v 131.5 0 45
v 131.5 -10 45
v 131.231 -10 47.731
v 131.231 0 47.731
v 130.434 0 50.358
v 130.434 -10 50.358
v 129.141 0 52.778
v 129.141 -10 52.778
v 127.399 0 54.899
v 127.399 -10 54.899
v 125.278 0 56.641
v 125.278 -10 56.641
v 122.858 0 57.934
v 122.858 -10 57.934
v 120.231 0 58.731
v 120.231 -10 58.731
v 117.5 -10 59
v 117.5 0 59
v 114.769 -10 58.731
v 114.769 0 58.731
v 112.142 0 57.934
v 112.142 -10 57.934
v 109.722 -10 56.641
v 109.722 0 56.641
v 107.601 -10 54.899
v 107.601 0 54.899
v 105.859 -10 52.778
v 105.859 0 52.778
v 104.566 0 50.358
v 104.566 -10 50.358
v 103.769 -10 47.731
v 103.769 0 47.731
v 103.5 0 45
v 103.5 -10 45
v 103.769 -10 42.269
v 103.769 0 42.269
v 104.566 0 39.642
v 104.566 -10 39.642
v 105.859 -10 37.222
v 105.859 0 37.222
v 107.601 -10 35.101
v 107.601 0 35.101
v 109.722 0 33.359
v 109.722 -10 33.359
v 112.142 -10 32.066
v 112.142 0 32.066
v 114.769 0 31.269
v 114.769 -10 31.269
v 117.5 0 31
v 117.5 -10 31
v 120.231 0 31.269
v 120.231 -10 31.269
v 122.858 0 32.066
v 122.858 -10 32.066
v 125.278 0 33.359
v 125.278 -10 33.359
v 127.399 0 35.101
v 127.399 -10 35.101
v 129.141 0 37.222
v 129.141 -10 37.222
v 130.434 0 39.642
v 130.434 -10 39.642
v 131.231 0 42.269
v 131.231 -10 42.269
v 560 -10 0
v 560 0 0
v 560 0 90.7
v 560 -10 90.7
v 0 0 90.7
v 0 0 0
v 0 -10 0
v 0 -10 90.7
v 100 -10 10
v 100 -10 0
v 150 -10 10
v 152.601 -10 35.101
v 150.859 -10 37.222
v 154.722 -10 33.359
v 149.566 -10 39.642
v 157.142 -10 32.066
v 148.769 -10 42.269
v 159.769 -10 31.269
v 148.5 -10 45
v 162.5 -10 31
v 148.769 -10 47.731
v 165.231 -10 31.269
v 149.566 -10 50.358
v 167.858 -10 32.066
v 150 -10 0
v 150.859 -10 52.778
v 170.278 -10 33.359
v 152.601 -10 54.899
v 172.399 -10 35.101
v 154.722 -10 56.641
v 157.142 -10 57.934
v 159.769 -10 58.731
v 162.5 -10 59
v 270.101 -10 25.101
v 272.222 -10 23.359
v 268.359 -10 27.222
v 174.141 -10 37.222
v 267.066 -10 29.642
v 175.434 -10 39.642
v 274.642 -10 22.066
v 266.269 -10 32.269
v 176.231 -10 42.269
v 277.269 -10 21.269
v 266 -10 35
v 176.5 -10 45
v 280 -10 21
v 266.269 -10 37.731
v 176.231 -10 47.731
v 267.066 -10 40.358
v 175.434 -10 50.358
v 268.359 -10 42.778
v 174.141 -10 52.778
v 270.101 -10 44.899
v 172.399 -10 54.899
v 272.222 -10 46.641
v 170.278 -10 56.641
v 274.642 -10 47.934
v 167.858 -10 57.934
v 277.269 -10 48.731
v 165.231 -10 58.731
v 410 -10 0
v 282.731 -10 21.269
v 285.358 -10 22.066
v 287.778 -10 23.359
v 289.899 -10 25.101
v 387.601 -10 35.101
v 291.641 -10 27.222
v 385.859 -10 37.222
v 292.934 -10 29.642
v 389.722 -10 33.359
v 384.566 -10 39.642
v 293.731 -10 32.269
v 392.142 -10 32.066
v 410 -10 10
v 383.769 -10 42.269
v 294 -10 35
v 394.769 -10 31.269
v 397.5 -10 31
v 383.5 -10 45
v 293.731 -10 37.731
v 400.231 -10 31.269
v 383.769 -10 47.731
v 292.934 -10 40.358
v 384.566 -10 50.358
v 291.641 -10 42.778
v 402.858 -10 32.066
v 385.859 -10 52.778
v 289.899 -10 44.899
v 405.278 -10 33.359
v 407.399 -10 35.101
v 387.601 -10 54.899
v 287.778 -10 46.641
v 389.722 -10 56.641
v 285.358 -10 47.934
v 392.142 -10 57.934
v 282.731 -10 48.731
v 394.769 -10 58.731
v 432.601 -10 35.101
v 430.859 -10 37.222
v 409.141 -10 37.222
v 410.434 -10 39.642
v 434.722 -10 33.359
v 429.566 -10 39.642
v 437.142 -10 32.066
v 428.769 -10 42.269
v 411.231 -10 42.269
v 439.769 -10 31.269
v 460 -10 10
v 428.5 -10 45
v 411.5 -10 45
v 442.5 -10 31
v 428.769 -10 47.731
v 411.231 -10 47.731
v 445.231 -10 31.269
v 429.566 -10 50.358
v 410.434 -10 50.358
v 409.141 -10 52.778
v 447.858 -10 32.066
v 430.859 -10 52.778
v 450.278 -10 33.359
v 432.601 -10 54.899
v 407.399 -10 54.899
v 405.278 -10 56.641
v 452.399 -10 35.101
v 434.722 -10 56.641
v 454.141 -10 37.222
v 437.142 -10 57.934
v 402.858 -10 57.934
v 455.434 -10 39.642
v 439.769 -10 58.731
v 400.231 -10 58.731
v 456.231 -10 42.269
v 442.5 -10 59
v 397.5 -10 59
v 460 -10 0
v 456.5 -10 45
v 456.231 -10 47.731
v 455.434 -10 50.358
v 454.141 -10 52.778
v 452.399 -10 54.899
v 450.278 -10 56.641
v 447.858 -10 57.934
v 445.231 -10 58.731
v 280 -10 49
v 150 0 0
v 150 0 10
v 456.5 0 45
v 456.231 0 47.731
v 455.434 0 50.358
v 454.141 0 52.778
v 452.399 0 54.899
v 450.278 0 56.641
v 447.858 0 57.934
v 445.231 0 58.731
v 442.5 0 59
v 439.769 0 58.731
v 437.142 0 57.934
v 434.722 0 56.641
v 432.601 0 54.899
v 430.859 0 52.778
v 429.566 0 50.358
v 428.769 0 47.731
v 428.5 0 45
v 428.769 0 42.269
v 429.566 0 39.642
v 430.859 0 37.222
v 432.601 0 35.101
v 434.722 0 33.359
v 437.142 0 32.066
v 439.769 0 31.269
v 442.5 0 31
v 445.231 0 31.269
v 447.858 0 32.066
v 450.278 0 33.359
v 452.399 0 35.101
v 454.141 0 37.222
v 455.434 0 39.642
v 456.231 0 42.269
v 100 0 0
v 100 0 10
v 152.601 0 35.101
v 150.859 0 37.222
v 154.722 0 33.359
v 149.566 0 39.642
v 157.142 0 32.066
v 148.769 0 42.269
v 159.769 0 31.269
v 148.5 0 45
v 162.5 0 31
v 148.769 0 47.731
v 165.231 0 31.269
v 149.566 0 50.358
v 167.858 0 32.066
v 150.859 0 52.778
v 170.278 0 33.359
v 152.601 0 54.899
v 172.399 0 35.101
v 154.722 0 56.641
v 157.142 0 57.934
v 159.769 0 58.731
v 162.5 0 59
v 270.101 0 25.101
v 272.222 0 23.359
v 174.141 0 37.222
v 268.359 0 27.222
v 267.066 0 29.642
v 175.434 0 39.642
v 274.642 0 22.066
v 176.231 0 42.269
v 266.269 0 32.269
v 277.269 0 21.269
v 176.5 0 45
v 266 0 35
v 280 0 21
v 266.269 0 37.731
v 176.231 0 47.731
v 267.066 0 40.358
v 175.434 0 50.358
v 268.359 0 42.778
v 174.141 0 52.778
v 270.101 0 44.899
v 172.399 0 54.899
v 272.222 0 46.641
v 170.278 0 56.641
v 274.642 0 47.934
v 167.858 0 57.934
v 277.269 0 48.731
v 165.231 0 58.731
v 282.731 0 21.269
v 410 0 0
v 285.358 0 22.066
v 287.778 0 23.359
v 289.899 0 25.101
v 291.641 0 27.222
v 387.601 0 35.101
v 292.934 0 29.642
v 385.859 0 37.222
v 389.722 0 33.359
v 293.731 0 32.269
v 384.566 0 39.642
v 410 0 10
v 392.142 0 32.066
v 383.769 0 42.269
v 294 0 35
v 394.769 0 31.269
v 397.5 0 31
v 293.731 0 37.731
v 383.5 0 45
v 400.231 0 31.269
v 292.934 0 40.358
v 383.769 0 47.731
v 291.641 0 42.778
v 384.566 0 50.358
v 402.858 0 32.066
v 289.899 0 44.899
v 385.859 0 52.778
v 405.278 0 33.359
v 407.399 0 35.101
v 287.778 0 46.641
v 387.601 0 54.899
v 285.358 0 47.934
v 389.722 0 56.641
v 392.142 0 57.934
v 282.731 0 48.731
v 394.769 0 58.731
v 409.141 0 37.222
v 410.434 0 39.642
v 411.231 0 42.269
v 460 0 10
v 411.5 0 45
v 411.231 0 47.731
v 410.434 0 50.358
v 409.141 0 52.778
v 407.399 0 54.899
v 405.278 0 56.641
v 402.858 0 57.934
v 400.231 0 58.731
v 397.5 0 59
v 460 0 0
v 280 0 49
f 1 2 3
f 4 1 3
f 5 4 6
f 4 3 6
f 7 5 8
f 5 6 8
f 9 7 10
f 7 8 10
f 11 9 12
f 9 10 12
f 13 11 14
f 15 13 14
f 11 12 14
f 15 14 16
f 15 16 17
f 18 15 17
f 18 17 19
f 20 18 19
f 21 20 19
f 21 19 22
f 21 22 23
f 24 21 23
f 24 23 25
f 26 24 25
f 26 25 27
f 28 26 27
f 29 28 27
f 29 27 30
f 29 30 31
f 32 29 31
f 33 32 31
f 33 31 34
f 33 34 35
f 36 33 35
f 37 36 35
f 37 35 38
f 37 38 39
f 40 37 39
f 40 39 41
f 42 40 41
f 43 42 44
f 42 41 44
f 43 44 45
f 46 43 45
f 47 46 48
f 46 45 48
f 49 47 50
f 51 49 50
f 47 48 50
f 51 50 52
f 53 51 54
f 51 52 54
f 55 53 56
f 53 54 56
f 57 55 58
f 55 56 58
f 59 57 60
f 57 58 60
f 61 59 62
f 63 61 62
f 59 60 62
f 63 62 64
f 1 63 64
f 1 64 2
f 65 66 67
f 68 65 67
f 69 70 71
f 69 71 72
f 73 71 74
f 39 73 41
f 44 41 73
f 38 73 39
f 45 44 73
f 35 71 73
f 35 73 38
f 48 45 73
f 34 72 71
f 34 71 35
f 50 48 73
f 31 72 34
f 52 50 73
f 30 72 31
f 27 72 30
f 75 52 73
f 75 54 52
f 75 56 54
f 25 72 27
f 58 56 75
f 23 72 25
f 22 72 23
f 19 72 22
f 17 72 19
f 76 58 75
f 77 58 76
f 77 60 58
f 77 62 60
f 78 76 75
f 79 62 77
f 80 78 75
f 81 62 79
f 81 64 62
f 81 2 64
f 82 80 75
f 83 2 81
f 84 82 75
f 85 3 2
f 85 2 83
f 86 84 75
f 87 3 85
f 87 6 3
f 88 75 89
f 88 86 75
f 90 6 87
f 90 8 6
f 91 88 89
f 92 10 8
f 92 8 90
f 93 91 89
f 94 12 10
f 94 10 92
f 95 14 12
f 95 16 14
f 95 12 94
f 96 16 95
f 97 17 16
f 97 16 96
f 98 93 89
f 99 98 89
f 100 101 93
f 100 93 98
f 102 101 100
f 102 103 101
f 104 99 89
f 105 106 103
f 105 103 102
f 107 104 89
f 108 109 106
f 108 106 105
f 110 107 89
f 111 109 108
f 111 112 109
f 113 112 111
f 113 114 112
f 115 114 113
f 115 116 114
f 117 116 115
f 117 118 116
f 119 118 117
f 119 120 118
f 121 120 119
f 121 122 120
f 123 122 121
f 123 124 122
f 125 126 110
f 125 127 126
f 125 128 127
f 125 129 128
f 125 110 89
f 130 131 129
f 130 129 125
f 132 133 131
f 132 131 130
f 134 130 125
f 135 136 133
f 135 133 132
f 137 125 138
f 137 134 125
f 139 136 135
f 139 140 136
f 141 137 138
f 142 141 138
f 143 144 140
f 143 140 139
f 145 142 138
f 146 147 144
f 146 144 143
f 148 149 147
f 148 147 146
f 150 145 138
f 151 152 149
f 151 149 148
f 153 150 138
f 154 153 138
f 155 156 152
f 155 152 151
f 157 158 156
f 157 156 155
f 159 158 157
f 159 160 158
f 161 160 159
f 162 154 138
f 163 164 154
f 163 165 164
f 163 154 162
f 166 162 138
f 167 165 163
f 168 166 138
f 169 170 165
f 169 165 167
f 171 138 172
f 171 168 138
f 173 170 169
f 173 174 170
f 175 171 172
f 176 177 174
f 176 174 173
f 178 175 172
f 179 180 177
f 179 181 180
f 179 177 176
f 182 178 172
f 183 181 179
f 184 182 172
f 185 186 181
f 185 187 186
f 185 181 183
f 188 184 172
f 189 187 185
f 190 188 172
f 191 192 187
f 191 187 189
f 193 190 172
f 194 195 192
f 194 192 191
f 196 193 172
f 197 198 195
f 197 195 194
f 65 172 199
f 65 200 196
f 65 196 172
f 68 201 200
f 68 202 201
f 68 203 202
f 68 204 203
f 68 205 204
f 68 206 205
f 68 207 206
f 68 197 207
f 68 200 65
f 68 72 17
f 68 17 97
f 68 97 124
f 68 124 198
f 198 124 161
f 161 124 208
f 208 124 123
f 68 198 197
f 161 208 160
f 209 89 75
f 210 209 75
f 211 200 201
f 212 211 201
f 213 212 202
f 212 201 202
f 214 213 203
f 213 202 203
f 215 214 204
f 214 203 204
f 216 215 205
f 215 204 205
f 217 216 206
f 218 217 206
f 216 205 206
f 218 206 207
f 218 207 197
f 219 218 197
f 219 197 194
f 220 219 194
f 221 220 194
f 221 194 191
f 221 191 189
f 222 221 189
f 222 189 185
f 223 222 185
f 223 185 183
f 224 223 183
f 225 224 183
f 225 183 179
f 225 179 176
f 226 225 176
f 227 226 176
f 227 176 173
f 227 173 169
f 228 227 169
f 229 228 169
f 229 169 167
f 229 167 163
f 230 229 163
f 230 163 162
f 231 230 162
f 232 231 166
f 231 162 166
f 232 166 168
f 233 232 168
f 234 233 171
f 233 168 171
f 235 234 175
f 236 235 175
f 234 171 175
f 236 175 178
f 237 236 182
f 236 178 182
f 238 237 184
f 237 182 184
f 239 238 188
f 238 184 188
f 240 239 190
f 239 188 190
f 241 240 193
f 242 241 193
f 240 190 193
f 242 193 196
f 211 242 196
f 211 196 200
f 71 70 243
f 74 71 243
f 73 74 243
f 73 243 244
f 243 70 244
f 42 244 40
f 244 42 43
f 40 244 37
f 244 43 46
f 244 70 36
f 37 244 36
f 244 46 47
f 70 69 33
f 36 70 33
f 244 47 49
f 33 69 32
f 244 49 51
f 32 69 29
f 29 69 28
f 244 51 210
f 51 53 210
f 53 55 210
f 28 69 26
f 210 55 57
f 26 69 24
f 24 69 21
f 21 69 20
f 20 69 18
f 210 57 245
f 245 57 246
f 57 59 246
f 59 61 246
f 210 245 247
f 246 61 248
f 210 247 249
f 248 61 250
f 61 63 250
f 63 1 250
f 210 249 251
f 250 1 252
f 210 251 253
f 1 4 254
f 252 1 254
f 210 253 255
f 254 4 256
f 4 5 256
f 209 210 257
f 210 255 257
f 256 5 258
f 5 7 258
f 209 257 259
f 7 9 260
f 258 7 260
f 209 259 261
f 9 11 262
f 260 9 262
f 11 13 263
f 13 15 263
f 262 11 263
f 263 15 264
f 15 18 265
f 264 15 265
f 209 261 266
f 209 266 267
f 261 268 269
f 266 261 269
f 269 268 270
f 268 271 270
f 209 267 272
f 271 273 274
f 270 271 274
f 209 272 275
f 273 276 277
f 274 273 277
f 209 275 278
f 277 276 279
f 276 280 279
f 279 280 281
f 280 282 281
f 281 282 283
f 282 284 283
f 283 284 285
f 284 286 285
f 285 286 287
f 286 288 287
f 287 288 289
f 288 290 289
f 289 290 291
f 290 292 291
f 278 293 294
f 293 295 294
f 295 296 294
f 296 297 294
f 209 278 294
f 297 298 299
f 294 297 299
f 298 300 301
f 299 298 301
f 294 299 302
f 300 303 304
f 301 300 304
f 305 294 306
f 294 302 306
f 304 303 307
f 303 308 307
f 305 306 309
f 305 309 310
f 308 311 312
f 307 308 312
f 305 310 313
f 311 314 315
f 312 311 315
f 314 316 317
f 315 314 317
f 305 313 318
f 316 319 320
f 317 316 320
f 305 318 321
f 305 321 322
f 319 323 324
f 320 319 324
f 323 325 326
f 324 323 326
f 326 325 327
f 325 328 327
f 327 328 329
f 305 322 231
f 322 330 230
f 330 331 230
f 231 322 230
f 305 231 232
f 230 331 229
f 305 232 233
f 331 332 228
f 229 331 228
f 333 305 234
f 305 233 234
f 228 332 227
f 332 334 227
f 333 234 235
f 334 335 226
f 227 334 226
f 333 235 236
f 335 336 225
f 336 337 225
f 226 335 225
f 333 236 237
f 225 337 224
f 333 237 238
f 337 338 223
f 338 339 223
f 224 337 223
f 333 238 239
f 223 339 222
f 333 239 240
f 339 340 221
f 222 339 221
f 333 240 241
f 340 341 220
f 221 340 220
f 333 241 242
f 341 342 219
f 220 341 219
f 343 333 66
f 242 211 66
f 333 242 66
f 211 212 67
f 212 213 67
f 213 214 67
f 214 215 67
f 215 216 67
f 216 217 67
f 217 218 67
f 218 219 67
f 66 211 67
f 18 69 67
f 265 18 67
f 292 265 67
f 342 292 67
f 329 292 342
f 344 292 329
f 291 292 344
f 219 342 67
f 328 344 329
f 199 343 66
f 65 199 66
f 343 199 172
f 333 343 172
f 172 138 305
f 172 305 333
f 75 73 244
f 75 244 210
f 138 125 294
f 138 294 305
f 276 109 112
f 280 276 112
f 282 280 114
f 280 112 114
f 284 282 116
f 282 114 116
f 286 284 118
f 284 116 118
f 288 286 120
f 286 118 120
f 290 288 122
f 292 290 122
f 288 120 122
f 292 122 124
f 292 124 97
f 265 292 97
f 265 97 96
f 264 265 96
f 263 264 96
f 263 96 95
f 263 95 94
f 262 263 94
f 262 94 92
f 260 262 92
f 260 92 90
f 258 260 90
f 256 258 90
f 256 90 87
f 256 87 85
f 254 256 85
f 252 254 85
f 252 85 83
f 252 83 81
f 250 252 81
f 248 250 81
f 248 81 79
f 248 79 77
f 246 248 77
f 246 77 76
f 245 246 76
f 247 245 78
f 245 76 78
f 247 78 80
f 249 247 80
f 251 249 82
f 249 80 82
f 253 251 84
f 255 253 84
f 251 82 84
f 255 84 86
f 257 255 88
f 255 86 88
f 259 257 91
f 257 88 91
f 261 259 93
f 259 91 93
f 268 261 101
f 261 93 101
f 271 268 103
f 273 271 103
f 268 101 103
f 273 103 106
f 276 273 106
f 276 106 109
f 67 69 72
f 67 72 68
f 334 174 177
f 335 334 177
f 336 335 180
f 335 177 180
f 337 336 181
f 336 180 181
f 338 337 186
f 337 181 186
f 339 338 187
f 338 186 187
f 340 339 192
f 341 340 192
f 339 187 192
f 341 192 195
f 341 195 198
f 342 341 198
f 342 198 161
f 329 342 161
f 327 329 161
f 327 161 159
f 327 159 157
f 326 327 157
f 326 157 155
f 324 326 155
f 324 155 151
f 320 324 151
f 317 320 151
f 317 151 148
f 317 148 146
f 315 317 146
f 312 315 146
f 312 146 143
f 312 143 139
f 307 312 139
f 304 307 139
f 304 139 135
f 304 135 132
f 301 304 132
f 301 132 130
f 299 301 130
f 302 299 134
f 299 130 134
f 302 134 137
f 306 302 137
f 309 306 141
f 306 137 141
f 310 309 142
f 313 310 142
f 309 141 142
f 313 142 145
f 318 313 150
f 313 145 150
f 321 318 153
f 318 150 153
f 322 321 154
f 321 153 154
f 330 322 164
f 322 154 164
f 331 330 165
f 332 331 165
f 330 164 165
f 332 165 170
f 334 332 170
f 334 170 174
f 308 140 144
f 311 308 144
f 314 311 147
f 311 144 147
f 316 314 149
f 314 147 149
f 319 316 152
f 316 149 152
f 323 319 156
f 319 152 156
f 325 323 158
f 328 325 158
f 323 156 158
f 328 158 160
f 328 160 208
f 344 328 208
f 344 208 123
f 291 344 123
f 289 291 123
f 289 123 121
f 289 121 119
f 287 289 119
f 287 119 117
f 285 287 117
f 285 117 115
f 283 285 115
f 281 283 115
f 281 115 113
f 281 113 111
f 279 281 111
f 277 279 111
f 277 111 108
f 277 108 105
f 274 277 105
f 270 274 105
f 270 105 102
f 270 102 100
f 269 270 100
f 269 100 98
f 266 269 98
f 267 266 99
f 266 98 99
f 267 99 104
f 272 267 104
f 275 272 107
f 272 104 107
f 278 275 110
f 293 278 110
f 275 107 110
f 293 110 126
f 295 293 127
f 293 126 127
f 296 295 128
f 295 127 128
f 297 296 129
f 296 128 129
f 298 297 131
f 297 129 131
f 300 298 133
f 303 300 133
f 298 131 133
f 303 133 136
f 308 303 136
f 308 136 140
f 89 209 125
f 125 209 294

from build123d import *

# Parameters (mm, degrees)
SKETCH_W        = 560
SKETCH_H        = 90.7
PAD_DEPTH       = 10
SKETCH001_R     = 14
POCKET_DEPTH    = 10.001
SKETCH002_W     = 50
SKETCH002_H     = 10
POCKET001_DEPTH = 10.001


with BuildPart() as part:
    # Sketch → Pad (new body)
    with BuildSketch(Plane.XZ):
        with Locations((280, 45.35)):
            Rectangle(SKETCH_W, SKETCH_H)
    extrude(amount=PAD_DEPTH)

    # Sketch001 → Pocket (cut, through all)
    with BuildSketch(Plane.XZ.offset(10)):
        with Locations((117.5, 45)):
            Circle(SKETCH001_R)
        with Locations((162.5, 45)):
            Circle(SKETCH001_R)
        with Locations((397.5, 45)):
            Circle(SKETCH001_R)
        with Locations((442.5, 45)):
            Circle(SKETCH001_R)
        with Locations((280, 35)):
            Circle(SKETCH001_R)
    extrude(amount=-POCKET_DEPTH, mode=Mode.SUBTRACT)

    # Sketch002 → Pocket001 (cut, through all)
    with BuildSketch(Plane.XZ.offset(10)):
        with Locations((125, 5)):
            Rectangle(SKETCH002_W, SKETCH002_H)
        with Locations((435, 5)):
            Rectangle(SKETCH002_W, SKETCH002_H)
    extrude(amount=-POCKET001_DEPTH, mode=Mode.SUBTRACT)


solid = part.part
